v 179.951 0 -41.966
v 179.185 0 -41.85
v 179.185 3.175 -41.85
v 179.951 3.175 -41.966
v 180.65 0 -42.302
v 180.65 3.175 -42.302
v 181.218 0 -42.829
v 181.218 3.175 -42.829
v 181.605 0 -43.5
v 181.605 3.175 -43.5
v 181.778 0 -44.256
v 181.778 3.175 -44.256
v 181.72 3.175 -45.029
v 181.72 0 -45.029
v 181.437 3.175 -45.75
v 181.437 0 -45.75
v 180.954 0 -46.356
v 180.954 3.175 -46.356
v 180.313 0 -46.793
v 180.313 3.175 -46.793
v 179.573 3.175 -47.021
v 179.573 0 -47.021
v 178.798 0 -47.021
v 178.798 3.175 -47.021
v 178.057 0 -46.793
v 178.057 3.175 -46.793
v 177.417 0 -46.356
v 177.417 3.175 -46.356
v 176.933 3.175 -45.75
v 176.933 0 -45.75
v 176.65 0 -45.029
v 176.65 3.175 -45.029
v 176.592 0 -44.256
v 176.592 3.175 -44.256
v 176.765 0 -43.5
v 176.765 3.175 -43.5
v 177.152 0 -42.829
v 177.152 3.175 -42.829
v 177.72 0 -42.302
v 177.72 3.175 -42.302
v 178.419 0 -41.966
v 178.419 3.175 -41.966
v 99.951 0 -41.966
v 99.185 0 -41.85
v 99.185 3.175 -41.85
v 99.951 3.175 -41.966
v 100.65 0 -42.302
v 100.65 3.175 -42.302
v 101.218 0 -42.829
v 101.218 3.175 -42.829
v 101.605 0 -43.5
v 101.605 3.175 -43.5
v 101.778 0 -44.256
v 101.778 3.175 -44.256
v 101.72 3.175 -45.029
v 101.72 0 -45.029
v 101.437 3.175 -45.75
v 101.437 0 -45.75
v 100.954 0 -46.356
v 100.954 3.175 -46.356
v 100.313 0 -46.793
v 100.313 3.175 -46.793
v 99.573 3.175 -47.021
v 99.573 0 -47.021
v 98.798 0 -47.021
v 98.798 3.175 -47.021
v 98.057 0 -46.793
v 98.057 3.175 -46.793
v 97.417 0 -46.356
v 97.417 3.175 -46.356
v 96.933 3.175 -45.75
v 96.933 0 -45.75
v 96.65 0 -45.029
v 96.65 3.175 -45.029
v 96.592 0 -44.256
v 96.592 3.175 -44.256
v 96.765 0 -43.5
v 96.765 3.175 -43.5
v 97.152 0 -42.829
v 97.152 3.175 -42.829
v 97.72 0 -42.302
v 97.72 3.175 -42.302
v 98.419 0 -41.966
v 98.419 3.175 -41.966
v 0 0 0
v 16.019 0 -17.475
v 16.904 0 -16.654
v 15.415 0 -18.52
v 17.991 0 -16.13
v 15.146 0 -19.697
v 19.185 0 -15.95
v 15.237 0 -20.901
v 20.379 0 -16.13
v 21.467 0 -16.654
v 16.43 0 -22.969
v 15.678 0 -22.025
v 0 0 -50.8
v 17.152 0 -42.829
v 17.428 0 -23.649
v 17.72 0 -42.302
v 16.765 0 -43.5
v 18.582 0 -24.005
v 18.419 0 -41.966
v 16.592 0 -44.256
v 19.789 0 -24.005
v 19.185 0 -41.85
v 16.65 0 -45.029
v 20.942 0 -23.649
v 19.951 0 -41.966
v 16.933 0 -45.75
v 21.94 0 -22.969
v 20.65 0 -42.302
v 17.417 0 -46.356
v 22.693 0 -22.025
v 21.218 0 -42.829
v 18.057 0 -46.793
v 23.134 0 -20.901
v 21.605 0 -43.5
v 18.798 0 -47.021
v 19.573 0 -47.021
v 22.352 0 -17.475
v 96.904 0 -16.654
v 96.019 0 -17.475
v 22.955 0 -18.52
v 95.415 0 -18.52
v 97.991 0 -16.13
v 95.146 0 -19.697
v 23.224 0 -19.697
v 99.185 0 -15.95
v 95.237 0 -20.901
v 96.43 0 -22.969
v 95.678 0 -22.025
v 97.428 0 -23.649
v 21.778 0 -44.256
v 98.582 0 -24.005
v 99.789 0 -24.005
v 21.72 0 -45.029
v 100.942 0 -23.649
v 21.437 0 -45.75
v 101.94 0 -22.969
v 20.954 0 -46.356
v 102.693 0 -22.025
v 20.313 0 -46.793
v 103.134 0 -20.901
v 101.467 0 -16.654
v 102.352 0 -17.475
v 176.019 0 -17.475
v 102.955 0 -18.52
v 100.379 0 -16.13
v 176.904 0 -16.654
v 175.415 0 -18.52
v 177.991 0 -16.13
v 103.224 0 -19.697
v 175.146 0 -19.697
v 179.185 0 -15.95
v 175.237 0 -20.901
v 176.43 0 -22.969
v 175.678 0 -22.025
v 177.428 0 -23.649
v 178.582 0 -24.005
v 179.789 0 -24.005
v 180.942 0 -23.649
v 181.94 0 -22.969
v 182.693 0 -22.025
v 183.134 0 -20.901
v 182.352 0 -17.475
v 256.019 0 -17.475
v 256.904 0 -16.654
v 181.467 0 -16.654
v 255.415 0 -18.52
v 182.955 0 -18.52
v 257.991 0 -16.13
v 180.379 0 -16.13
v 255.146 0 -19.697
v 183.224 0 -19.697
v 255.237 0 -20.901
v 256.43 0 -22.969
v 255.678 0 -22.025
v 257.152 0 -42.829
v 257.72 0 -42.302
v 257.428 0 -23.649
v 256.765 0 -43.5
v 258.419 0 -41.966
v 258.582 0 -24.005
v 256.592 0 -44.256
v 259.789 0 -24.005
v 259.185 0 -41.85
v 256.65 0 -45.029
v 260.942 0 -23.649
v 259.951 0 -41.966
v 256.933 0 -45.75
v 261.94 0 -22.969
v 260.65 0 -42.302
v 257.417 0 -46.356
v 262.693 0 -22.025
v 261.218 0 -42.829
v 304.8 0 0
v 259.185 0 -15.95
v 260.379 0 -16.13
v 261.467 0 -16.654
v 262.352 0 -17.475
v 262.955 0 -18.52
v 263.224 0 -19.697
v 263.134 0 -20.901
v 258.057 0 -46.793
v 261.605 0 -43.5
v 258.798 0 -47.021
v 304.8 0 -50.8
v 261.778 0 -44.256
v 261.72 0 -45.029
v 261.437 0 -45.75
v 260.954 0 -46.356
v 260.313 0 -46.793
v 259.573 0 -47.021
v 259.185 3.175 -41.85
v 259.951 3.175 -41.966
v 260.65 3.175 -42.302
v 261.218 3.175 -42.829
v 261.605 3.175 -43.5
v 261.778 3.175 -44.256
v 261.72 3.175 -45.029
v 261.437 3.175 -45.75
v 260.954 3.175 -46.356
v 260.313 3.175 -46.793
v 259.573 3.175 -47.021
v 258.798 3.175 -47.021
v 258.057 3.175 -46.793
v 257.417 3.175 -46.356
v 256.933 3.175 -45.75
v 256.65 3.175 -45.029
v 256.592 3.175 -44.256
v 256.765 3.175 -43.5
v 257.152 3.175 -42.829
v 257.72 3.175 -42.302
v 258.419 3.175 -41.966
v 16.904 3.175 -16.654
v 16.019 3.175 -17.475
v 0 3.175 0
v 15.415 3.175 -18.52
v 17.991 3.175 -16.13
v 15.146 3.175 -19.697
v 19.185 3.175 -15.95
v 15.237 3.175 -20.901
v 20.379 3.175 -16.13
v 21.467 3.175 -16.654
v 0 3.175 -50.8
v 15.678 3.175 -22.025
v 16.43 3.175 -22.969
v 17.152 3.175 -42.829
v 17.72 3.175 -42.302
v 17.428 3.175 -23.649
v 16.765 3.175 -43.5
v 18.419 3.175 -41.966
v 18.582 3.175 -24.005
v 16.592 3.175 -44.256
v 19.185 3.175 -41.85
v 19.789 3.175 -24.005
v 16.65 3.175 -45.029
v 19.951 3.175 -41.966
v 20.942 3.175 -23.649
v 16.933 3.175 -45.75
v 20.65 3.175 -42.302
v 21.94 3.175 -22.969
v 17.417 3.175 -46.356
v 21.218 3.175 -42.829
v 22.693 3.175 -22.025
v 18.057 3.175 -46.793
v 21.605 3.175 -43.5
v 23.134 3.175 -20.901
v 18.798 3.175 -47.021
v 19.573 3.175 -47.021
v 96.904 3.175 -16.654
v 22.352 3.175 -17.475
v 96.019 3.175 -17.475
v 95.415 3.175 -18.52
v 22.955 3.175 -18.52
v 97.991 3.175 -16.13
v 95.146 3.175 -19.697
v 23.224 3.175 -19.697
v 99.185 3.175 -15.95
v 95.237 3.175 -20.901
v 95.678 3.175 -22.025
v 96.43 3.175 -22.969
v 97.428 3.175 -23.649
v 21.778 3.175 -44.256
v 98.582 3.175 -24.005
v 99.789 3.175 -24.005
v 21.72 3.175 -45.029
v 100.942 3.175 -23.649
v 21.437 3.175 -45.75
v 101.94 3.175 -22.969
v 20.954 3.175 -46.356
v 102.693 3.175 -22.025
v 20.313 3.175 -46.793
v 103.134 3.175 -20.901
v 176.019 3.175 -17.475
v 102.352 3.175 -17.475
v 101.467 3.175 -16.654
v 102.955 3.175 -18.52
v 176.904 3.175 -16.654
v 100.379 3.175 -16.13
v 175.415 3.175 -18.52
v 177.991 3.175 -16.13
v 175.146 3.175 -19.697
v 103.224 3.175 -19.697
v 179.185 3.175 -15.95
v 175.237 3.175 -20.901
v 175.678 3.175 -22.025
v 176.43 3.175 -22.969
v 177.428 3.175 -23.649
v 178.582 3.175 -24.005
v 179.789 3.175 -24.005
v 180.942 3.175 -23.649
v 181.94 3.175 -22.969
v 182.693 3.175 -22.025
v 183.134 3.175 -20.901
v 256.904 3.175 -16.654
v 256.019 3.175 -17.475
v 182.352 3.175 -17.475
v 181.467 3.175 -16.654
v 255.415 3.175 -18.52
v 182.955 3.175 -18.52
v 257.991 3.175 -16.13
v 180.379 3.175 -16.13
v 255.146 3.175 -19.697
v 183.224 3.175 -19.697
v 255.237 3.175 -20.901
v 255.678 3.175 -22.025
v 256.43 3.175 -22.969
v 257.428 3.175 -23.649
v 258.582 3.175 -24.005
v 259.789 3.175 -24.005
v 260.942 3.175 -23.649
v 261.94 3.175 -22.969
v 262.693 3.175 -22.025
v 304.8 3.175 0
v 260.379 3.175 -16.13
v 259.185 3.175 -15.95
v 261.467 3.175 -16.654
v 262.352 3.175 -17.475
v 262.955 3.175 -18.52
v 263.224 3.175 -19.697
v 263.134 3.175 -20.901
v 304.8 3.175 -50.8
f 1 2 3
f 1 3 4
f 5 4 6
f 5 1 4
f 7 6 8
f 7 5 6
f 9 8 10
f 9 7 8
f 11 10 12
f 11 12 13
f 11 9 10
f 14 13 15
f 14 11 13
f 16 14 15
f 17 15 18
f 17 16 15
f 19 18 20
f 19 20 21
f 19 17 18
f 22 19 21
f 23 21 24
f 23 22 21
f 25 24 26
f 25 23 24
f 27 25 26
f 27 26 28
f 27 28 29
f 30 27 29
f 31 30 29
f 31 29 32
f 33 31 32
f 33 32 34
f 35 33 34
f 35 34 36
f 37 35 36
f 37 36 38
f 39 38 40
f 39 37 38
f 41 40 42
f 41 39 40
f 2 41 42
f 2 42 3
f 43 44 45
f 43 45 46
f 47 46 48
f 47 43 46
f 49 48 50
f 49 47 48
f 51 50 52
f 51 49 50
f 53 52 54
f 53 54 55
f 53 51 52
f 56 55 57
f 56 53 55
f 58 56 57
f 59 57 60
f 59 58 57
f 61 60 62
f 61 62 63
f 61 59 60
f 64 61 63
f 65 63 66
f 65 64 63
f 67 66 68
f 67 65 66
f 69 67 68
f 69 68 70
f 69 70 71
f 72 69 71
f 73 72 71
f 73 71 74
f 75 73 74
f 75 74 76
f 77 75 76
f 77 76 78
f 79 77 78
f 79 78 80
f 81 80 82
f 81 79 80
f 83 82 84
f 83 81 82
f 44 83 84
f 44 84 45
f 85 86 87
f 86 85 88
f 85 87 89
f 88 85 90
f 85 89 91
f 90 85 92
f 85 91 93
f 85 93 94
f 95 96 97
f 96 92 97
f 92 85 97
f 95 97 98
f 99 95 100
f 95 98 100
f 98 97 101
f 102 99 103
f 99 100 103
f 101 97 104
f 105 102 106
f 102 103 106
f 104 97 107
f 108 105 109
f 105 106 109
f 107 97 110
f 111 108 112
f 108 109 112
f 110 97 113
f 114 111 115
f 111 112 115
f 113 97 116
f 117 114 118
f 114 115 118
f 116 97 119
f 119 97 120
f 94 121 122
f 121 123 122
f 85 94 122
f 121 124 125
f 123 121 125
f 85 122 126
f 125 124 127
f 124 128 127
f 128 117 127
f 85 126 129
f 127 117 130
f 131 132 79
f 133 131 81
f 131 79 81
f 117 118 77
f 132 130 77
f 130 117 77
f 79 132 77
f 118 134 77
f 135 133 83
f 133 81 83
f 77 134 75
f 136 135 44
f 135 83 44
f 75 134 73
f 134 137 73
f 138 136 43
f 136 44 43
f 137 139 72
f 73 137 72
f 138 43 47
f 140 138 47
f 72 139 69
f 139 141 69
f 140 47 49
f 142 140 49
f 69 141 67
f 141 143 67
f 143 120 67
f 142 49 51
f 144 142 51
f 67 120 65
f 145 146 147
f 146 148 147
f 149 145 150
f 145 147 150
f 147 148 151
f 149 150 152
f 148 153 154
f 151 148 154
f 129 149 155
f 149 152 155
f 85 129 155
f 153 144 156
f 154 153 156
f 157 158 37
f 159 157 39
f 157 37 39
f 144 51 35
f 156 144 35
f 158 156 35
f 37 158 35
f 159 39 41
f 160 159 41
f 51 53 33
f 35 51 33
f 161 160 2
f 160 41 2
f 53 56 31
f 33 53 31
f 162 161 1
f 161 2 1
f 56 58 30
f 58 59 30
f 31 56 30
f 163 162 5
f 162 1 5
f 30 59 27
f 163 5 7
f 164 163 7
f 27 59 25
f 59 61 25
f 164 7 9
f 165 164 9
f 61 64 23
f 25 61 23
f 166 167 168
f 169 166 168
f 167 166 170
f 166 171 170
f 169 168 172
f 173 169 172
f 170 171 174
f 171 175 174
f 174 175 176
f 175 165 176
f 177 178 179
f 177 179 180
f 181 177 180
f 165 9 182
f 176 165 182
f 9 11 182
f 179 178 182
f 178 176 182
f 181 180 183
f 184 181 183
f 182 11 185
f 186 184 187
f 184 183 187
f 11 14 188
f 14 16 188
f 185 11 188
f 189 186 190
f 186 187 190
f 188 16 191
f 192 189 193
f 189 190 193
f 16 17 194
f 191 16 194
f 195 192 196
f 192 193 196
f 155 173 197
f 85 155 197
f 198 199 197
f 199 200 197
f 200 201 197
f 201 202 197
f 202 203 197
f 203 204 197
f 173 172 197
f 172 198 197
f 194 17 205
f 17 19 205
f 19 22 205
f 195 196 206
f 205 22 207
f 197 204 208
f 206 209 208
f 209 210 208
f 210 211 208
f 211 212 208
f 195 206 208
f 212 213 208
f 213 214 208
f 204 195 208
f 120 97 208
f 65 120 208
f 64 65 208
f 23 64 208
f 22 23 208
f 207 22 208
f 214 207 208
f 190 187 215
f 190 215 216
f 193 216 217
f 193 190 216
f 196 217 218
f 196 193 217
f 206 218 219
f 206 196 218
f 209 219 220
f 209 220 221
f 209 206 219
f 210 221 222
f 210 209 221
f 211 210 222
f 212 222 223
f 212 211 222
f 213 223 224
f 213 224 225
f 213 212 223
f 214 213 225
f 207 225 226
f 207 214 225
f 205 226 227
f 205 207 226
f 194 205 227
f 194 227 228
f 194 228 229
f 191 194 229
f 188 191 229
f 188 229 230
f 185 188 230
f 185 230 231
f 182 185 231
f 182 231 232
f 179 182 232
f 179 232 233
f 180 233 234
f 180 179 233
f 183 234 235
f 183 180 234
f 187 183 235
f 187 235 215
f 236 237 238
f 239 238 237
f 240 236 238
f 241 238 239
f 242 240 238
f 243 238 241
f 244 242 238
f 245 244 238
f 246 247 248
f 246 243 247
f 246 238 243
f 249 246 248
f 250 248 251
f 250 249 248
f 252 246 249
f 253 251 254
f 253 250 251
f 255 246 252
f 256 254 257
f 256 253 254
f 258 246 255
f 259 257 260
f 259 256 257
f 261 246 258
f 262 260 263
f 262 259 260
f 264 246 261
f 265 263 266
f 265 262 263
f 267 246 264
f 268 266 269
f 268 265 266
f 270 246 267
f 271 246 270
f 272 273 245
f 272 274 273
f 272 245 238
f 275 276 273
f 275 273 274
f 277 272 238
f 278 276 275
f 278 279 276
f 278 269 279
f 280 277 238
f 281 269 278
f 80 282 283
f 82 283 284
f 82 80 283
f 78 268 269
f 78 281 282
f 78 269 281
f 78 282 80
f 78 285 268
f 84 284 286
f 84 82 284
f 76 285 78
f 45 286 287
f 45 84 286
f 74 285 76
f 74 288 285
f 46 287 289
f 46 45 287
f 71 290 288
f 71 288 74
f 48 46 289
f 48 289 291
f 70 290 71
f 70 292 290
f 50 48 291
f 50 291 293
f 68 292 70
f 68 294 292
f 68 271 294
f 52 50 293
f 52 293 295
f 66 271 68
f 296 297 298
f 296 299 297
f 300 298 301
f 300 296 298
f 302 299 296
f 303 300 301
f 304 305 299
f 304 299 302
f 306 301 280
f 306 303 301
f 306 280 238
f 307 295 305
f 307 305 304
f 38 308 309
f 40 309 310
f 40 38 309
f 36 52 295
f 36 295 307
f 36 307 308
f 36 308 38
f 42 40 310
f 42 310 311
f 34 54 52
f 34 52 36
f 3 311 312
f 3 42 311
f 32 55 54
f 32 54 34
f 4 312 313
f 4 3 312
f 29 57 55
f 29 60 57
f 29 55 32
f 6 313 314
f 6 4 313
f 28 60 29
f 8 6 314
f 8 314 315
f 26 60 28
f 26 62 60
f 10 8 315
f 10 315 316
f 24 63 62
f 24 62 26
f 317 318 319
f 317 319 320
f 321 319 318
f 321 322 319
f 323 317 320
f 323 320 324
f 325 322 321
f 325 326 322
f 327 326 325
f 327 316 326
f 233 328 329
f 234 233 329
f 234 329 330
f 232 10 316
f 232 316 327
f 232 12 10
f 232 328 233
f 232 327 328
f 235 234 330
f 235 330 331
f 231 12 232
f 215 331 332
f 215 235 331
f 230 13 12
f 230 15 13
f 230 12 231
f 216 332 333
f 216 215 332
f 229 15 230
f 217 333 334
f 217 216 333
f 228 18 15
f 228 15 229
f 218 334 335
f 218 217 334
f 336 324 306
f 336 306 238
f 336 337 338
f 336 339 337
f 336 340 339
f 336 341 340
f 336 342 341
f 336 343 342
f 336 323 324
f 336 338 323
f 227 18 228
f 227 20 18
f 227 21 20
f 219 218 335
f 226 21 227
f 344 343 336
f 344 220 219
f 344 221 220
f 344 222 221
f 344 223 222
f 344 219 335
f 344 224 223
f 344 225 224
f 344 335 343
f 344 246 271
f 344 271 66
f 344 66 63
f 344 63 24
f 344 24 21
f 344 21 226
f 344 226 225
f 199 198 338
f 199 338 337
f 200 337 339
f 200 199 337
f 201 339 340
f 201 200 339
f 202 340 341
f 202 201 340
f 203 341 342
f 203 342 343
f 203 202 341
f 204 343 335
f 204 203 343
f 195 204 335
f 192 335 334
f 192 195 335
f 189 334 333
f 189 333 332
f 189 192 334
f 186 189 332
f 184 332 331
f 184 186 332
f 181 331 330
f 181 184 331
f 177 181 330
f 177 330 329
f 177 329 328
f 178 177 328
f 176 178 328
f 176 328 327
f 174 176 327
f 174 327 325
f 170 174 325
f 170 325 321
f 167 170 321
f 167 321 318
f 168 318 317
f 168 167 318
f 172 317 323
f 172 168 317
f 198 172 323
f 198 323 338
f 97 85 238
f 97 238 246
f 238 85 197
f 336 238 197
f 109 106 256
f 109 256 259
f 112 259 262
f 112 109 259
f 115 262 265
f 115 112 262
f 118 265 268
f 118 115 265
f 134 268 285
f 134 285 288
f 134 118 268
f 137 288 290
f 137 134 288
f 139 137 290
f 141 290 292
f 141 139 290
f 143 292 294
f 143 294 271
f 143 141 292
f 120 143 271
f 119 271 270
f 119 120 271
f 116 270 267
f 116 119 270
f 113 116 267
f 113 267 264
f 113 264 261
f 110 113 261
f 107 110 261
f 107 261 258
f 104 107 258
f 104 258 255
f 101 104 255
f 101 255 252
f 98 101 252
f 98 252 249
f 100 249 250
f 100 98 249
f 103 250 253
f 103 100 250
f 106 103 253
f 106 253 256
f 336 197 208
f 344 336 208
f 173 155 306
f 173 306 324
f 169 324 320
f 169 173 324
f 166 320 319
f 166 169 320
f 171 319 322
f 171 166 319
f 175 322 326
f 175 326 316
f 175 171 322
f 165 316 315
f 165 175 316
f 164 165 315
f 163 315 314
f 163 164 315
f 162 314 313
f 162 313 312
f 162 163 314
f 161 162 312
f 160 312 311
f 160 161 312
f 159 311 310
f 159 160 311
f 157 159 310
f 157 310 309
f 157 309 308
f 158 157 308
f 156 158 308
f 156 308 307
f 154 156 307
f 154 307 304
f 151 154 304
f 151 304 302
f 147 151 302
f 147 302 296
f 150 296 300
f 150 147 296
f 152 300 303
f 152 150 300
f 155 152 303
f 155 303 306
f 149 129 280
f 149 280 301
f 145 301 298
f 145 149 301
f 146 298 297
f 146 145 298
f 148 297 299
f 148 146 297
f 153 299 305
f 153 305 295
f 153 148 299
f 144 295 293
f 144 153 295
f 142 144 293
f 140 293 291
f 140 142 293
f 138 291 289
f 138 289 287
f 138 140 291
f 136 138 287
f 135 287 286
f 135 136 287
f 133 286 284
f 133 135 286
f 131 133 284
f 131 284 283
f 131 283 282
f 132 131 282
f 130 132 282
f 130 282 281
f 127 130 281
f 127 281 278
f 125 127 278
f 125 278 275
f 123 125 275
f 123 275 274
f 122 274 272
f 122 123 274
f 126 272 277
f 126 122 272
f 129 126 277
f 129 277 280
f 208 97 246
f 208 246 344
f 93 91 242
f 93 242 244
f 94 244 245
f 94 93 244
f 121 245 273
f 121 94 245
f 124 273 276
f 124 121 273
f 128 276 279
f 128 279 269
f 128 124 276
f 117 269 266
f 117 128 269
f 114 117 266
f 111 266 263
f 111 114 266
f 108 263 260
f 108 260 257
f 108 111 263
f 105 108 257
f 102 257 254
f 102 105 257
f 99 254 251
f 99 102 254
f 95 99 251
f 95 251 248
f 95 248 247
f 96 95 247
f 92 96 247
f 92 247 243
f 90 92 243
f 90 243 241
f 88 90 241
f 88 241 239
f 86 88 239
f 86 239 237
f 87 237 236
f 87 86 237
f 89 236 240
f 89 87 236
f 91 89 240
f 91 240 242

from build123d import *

# Parameters (mm, degrees)
SKETCH1_W           = 304.8
SKETCH1_H           = 50.8
SKETCH1_R           = 2.6
SKETCH1_R_2         = 4.05
BOSS_EXTRUDE1_DEPTH = 3.175


with BuildPart() as part:
    # Sketch1 → Boss-Extrude1 (new body)
    with BuildSketch(Plane(origin=(0, 0, 0), x_dir=(1, 0, 0), z_dir=(0, 1, 0))):
        with Locations((152.4, 25.4)):
            Rectangle(SKETCH1_W, SKETCH1_H)
        with Locations(Location((19.185127899, 44.45, 0), (0, 0, 270))):
            Circle(SKETCH1_R, mode=Mode.SUBTRACT)
        with Locations(Location((19.185127899, 20, 0), (0, 0, 270))):
            Circle(SKETCH1_R_2, mode=Mode.SUBTRACT)
        with Locations(Location((99.185127899, 20, 0), (0, 0, 270))):
            Circle(SKETCH1_R_2, mode=Mode.SUBTRACT)
        with Locations(Location((99.185127899, 44.45, 0), (0, 0, 270))):
            Circle(SKETCH1_R, mode=Mode.SUBTRACT)
        with Locations(Location((179.185127899, 20, 0), (0, 0, 270))):
            Circle(SKETCH1_R_2, mode=Mode.SUBTRACT)
        with Locations(Location((179.185127899, 44.45, 0), (0, 0, 270))):
            Circle(SKETCH1_R, mode=Mode.SUBTRACT)
        with Locations(Location((259.185127899, 20, 0), (0, 0, 270))):
            Circle(SKETCH1_R_2, mode=Mode.SUBTRACT)
        with Locations(Location((259.185127899, 44.45, 0), (0, 0, 270))):
            Circle(SKETCH1_R, mode=Mode.SUBTRACT)
    extrude(amount=BOSS_EXTRUDE1_DEPTH)


solid = part.part
